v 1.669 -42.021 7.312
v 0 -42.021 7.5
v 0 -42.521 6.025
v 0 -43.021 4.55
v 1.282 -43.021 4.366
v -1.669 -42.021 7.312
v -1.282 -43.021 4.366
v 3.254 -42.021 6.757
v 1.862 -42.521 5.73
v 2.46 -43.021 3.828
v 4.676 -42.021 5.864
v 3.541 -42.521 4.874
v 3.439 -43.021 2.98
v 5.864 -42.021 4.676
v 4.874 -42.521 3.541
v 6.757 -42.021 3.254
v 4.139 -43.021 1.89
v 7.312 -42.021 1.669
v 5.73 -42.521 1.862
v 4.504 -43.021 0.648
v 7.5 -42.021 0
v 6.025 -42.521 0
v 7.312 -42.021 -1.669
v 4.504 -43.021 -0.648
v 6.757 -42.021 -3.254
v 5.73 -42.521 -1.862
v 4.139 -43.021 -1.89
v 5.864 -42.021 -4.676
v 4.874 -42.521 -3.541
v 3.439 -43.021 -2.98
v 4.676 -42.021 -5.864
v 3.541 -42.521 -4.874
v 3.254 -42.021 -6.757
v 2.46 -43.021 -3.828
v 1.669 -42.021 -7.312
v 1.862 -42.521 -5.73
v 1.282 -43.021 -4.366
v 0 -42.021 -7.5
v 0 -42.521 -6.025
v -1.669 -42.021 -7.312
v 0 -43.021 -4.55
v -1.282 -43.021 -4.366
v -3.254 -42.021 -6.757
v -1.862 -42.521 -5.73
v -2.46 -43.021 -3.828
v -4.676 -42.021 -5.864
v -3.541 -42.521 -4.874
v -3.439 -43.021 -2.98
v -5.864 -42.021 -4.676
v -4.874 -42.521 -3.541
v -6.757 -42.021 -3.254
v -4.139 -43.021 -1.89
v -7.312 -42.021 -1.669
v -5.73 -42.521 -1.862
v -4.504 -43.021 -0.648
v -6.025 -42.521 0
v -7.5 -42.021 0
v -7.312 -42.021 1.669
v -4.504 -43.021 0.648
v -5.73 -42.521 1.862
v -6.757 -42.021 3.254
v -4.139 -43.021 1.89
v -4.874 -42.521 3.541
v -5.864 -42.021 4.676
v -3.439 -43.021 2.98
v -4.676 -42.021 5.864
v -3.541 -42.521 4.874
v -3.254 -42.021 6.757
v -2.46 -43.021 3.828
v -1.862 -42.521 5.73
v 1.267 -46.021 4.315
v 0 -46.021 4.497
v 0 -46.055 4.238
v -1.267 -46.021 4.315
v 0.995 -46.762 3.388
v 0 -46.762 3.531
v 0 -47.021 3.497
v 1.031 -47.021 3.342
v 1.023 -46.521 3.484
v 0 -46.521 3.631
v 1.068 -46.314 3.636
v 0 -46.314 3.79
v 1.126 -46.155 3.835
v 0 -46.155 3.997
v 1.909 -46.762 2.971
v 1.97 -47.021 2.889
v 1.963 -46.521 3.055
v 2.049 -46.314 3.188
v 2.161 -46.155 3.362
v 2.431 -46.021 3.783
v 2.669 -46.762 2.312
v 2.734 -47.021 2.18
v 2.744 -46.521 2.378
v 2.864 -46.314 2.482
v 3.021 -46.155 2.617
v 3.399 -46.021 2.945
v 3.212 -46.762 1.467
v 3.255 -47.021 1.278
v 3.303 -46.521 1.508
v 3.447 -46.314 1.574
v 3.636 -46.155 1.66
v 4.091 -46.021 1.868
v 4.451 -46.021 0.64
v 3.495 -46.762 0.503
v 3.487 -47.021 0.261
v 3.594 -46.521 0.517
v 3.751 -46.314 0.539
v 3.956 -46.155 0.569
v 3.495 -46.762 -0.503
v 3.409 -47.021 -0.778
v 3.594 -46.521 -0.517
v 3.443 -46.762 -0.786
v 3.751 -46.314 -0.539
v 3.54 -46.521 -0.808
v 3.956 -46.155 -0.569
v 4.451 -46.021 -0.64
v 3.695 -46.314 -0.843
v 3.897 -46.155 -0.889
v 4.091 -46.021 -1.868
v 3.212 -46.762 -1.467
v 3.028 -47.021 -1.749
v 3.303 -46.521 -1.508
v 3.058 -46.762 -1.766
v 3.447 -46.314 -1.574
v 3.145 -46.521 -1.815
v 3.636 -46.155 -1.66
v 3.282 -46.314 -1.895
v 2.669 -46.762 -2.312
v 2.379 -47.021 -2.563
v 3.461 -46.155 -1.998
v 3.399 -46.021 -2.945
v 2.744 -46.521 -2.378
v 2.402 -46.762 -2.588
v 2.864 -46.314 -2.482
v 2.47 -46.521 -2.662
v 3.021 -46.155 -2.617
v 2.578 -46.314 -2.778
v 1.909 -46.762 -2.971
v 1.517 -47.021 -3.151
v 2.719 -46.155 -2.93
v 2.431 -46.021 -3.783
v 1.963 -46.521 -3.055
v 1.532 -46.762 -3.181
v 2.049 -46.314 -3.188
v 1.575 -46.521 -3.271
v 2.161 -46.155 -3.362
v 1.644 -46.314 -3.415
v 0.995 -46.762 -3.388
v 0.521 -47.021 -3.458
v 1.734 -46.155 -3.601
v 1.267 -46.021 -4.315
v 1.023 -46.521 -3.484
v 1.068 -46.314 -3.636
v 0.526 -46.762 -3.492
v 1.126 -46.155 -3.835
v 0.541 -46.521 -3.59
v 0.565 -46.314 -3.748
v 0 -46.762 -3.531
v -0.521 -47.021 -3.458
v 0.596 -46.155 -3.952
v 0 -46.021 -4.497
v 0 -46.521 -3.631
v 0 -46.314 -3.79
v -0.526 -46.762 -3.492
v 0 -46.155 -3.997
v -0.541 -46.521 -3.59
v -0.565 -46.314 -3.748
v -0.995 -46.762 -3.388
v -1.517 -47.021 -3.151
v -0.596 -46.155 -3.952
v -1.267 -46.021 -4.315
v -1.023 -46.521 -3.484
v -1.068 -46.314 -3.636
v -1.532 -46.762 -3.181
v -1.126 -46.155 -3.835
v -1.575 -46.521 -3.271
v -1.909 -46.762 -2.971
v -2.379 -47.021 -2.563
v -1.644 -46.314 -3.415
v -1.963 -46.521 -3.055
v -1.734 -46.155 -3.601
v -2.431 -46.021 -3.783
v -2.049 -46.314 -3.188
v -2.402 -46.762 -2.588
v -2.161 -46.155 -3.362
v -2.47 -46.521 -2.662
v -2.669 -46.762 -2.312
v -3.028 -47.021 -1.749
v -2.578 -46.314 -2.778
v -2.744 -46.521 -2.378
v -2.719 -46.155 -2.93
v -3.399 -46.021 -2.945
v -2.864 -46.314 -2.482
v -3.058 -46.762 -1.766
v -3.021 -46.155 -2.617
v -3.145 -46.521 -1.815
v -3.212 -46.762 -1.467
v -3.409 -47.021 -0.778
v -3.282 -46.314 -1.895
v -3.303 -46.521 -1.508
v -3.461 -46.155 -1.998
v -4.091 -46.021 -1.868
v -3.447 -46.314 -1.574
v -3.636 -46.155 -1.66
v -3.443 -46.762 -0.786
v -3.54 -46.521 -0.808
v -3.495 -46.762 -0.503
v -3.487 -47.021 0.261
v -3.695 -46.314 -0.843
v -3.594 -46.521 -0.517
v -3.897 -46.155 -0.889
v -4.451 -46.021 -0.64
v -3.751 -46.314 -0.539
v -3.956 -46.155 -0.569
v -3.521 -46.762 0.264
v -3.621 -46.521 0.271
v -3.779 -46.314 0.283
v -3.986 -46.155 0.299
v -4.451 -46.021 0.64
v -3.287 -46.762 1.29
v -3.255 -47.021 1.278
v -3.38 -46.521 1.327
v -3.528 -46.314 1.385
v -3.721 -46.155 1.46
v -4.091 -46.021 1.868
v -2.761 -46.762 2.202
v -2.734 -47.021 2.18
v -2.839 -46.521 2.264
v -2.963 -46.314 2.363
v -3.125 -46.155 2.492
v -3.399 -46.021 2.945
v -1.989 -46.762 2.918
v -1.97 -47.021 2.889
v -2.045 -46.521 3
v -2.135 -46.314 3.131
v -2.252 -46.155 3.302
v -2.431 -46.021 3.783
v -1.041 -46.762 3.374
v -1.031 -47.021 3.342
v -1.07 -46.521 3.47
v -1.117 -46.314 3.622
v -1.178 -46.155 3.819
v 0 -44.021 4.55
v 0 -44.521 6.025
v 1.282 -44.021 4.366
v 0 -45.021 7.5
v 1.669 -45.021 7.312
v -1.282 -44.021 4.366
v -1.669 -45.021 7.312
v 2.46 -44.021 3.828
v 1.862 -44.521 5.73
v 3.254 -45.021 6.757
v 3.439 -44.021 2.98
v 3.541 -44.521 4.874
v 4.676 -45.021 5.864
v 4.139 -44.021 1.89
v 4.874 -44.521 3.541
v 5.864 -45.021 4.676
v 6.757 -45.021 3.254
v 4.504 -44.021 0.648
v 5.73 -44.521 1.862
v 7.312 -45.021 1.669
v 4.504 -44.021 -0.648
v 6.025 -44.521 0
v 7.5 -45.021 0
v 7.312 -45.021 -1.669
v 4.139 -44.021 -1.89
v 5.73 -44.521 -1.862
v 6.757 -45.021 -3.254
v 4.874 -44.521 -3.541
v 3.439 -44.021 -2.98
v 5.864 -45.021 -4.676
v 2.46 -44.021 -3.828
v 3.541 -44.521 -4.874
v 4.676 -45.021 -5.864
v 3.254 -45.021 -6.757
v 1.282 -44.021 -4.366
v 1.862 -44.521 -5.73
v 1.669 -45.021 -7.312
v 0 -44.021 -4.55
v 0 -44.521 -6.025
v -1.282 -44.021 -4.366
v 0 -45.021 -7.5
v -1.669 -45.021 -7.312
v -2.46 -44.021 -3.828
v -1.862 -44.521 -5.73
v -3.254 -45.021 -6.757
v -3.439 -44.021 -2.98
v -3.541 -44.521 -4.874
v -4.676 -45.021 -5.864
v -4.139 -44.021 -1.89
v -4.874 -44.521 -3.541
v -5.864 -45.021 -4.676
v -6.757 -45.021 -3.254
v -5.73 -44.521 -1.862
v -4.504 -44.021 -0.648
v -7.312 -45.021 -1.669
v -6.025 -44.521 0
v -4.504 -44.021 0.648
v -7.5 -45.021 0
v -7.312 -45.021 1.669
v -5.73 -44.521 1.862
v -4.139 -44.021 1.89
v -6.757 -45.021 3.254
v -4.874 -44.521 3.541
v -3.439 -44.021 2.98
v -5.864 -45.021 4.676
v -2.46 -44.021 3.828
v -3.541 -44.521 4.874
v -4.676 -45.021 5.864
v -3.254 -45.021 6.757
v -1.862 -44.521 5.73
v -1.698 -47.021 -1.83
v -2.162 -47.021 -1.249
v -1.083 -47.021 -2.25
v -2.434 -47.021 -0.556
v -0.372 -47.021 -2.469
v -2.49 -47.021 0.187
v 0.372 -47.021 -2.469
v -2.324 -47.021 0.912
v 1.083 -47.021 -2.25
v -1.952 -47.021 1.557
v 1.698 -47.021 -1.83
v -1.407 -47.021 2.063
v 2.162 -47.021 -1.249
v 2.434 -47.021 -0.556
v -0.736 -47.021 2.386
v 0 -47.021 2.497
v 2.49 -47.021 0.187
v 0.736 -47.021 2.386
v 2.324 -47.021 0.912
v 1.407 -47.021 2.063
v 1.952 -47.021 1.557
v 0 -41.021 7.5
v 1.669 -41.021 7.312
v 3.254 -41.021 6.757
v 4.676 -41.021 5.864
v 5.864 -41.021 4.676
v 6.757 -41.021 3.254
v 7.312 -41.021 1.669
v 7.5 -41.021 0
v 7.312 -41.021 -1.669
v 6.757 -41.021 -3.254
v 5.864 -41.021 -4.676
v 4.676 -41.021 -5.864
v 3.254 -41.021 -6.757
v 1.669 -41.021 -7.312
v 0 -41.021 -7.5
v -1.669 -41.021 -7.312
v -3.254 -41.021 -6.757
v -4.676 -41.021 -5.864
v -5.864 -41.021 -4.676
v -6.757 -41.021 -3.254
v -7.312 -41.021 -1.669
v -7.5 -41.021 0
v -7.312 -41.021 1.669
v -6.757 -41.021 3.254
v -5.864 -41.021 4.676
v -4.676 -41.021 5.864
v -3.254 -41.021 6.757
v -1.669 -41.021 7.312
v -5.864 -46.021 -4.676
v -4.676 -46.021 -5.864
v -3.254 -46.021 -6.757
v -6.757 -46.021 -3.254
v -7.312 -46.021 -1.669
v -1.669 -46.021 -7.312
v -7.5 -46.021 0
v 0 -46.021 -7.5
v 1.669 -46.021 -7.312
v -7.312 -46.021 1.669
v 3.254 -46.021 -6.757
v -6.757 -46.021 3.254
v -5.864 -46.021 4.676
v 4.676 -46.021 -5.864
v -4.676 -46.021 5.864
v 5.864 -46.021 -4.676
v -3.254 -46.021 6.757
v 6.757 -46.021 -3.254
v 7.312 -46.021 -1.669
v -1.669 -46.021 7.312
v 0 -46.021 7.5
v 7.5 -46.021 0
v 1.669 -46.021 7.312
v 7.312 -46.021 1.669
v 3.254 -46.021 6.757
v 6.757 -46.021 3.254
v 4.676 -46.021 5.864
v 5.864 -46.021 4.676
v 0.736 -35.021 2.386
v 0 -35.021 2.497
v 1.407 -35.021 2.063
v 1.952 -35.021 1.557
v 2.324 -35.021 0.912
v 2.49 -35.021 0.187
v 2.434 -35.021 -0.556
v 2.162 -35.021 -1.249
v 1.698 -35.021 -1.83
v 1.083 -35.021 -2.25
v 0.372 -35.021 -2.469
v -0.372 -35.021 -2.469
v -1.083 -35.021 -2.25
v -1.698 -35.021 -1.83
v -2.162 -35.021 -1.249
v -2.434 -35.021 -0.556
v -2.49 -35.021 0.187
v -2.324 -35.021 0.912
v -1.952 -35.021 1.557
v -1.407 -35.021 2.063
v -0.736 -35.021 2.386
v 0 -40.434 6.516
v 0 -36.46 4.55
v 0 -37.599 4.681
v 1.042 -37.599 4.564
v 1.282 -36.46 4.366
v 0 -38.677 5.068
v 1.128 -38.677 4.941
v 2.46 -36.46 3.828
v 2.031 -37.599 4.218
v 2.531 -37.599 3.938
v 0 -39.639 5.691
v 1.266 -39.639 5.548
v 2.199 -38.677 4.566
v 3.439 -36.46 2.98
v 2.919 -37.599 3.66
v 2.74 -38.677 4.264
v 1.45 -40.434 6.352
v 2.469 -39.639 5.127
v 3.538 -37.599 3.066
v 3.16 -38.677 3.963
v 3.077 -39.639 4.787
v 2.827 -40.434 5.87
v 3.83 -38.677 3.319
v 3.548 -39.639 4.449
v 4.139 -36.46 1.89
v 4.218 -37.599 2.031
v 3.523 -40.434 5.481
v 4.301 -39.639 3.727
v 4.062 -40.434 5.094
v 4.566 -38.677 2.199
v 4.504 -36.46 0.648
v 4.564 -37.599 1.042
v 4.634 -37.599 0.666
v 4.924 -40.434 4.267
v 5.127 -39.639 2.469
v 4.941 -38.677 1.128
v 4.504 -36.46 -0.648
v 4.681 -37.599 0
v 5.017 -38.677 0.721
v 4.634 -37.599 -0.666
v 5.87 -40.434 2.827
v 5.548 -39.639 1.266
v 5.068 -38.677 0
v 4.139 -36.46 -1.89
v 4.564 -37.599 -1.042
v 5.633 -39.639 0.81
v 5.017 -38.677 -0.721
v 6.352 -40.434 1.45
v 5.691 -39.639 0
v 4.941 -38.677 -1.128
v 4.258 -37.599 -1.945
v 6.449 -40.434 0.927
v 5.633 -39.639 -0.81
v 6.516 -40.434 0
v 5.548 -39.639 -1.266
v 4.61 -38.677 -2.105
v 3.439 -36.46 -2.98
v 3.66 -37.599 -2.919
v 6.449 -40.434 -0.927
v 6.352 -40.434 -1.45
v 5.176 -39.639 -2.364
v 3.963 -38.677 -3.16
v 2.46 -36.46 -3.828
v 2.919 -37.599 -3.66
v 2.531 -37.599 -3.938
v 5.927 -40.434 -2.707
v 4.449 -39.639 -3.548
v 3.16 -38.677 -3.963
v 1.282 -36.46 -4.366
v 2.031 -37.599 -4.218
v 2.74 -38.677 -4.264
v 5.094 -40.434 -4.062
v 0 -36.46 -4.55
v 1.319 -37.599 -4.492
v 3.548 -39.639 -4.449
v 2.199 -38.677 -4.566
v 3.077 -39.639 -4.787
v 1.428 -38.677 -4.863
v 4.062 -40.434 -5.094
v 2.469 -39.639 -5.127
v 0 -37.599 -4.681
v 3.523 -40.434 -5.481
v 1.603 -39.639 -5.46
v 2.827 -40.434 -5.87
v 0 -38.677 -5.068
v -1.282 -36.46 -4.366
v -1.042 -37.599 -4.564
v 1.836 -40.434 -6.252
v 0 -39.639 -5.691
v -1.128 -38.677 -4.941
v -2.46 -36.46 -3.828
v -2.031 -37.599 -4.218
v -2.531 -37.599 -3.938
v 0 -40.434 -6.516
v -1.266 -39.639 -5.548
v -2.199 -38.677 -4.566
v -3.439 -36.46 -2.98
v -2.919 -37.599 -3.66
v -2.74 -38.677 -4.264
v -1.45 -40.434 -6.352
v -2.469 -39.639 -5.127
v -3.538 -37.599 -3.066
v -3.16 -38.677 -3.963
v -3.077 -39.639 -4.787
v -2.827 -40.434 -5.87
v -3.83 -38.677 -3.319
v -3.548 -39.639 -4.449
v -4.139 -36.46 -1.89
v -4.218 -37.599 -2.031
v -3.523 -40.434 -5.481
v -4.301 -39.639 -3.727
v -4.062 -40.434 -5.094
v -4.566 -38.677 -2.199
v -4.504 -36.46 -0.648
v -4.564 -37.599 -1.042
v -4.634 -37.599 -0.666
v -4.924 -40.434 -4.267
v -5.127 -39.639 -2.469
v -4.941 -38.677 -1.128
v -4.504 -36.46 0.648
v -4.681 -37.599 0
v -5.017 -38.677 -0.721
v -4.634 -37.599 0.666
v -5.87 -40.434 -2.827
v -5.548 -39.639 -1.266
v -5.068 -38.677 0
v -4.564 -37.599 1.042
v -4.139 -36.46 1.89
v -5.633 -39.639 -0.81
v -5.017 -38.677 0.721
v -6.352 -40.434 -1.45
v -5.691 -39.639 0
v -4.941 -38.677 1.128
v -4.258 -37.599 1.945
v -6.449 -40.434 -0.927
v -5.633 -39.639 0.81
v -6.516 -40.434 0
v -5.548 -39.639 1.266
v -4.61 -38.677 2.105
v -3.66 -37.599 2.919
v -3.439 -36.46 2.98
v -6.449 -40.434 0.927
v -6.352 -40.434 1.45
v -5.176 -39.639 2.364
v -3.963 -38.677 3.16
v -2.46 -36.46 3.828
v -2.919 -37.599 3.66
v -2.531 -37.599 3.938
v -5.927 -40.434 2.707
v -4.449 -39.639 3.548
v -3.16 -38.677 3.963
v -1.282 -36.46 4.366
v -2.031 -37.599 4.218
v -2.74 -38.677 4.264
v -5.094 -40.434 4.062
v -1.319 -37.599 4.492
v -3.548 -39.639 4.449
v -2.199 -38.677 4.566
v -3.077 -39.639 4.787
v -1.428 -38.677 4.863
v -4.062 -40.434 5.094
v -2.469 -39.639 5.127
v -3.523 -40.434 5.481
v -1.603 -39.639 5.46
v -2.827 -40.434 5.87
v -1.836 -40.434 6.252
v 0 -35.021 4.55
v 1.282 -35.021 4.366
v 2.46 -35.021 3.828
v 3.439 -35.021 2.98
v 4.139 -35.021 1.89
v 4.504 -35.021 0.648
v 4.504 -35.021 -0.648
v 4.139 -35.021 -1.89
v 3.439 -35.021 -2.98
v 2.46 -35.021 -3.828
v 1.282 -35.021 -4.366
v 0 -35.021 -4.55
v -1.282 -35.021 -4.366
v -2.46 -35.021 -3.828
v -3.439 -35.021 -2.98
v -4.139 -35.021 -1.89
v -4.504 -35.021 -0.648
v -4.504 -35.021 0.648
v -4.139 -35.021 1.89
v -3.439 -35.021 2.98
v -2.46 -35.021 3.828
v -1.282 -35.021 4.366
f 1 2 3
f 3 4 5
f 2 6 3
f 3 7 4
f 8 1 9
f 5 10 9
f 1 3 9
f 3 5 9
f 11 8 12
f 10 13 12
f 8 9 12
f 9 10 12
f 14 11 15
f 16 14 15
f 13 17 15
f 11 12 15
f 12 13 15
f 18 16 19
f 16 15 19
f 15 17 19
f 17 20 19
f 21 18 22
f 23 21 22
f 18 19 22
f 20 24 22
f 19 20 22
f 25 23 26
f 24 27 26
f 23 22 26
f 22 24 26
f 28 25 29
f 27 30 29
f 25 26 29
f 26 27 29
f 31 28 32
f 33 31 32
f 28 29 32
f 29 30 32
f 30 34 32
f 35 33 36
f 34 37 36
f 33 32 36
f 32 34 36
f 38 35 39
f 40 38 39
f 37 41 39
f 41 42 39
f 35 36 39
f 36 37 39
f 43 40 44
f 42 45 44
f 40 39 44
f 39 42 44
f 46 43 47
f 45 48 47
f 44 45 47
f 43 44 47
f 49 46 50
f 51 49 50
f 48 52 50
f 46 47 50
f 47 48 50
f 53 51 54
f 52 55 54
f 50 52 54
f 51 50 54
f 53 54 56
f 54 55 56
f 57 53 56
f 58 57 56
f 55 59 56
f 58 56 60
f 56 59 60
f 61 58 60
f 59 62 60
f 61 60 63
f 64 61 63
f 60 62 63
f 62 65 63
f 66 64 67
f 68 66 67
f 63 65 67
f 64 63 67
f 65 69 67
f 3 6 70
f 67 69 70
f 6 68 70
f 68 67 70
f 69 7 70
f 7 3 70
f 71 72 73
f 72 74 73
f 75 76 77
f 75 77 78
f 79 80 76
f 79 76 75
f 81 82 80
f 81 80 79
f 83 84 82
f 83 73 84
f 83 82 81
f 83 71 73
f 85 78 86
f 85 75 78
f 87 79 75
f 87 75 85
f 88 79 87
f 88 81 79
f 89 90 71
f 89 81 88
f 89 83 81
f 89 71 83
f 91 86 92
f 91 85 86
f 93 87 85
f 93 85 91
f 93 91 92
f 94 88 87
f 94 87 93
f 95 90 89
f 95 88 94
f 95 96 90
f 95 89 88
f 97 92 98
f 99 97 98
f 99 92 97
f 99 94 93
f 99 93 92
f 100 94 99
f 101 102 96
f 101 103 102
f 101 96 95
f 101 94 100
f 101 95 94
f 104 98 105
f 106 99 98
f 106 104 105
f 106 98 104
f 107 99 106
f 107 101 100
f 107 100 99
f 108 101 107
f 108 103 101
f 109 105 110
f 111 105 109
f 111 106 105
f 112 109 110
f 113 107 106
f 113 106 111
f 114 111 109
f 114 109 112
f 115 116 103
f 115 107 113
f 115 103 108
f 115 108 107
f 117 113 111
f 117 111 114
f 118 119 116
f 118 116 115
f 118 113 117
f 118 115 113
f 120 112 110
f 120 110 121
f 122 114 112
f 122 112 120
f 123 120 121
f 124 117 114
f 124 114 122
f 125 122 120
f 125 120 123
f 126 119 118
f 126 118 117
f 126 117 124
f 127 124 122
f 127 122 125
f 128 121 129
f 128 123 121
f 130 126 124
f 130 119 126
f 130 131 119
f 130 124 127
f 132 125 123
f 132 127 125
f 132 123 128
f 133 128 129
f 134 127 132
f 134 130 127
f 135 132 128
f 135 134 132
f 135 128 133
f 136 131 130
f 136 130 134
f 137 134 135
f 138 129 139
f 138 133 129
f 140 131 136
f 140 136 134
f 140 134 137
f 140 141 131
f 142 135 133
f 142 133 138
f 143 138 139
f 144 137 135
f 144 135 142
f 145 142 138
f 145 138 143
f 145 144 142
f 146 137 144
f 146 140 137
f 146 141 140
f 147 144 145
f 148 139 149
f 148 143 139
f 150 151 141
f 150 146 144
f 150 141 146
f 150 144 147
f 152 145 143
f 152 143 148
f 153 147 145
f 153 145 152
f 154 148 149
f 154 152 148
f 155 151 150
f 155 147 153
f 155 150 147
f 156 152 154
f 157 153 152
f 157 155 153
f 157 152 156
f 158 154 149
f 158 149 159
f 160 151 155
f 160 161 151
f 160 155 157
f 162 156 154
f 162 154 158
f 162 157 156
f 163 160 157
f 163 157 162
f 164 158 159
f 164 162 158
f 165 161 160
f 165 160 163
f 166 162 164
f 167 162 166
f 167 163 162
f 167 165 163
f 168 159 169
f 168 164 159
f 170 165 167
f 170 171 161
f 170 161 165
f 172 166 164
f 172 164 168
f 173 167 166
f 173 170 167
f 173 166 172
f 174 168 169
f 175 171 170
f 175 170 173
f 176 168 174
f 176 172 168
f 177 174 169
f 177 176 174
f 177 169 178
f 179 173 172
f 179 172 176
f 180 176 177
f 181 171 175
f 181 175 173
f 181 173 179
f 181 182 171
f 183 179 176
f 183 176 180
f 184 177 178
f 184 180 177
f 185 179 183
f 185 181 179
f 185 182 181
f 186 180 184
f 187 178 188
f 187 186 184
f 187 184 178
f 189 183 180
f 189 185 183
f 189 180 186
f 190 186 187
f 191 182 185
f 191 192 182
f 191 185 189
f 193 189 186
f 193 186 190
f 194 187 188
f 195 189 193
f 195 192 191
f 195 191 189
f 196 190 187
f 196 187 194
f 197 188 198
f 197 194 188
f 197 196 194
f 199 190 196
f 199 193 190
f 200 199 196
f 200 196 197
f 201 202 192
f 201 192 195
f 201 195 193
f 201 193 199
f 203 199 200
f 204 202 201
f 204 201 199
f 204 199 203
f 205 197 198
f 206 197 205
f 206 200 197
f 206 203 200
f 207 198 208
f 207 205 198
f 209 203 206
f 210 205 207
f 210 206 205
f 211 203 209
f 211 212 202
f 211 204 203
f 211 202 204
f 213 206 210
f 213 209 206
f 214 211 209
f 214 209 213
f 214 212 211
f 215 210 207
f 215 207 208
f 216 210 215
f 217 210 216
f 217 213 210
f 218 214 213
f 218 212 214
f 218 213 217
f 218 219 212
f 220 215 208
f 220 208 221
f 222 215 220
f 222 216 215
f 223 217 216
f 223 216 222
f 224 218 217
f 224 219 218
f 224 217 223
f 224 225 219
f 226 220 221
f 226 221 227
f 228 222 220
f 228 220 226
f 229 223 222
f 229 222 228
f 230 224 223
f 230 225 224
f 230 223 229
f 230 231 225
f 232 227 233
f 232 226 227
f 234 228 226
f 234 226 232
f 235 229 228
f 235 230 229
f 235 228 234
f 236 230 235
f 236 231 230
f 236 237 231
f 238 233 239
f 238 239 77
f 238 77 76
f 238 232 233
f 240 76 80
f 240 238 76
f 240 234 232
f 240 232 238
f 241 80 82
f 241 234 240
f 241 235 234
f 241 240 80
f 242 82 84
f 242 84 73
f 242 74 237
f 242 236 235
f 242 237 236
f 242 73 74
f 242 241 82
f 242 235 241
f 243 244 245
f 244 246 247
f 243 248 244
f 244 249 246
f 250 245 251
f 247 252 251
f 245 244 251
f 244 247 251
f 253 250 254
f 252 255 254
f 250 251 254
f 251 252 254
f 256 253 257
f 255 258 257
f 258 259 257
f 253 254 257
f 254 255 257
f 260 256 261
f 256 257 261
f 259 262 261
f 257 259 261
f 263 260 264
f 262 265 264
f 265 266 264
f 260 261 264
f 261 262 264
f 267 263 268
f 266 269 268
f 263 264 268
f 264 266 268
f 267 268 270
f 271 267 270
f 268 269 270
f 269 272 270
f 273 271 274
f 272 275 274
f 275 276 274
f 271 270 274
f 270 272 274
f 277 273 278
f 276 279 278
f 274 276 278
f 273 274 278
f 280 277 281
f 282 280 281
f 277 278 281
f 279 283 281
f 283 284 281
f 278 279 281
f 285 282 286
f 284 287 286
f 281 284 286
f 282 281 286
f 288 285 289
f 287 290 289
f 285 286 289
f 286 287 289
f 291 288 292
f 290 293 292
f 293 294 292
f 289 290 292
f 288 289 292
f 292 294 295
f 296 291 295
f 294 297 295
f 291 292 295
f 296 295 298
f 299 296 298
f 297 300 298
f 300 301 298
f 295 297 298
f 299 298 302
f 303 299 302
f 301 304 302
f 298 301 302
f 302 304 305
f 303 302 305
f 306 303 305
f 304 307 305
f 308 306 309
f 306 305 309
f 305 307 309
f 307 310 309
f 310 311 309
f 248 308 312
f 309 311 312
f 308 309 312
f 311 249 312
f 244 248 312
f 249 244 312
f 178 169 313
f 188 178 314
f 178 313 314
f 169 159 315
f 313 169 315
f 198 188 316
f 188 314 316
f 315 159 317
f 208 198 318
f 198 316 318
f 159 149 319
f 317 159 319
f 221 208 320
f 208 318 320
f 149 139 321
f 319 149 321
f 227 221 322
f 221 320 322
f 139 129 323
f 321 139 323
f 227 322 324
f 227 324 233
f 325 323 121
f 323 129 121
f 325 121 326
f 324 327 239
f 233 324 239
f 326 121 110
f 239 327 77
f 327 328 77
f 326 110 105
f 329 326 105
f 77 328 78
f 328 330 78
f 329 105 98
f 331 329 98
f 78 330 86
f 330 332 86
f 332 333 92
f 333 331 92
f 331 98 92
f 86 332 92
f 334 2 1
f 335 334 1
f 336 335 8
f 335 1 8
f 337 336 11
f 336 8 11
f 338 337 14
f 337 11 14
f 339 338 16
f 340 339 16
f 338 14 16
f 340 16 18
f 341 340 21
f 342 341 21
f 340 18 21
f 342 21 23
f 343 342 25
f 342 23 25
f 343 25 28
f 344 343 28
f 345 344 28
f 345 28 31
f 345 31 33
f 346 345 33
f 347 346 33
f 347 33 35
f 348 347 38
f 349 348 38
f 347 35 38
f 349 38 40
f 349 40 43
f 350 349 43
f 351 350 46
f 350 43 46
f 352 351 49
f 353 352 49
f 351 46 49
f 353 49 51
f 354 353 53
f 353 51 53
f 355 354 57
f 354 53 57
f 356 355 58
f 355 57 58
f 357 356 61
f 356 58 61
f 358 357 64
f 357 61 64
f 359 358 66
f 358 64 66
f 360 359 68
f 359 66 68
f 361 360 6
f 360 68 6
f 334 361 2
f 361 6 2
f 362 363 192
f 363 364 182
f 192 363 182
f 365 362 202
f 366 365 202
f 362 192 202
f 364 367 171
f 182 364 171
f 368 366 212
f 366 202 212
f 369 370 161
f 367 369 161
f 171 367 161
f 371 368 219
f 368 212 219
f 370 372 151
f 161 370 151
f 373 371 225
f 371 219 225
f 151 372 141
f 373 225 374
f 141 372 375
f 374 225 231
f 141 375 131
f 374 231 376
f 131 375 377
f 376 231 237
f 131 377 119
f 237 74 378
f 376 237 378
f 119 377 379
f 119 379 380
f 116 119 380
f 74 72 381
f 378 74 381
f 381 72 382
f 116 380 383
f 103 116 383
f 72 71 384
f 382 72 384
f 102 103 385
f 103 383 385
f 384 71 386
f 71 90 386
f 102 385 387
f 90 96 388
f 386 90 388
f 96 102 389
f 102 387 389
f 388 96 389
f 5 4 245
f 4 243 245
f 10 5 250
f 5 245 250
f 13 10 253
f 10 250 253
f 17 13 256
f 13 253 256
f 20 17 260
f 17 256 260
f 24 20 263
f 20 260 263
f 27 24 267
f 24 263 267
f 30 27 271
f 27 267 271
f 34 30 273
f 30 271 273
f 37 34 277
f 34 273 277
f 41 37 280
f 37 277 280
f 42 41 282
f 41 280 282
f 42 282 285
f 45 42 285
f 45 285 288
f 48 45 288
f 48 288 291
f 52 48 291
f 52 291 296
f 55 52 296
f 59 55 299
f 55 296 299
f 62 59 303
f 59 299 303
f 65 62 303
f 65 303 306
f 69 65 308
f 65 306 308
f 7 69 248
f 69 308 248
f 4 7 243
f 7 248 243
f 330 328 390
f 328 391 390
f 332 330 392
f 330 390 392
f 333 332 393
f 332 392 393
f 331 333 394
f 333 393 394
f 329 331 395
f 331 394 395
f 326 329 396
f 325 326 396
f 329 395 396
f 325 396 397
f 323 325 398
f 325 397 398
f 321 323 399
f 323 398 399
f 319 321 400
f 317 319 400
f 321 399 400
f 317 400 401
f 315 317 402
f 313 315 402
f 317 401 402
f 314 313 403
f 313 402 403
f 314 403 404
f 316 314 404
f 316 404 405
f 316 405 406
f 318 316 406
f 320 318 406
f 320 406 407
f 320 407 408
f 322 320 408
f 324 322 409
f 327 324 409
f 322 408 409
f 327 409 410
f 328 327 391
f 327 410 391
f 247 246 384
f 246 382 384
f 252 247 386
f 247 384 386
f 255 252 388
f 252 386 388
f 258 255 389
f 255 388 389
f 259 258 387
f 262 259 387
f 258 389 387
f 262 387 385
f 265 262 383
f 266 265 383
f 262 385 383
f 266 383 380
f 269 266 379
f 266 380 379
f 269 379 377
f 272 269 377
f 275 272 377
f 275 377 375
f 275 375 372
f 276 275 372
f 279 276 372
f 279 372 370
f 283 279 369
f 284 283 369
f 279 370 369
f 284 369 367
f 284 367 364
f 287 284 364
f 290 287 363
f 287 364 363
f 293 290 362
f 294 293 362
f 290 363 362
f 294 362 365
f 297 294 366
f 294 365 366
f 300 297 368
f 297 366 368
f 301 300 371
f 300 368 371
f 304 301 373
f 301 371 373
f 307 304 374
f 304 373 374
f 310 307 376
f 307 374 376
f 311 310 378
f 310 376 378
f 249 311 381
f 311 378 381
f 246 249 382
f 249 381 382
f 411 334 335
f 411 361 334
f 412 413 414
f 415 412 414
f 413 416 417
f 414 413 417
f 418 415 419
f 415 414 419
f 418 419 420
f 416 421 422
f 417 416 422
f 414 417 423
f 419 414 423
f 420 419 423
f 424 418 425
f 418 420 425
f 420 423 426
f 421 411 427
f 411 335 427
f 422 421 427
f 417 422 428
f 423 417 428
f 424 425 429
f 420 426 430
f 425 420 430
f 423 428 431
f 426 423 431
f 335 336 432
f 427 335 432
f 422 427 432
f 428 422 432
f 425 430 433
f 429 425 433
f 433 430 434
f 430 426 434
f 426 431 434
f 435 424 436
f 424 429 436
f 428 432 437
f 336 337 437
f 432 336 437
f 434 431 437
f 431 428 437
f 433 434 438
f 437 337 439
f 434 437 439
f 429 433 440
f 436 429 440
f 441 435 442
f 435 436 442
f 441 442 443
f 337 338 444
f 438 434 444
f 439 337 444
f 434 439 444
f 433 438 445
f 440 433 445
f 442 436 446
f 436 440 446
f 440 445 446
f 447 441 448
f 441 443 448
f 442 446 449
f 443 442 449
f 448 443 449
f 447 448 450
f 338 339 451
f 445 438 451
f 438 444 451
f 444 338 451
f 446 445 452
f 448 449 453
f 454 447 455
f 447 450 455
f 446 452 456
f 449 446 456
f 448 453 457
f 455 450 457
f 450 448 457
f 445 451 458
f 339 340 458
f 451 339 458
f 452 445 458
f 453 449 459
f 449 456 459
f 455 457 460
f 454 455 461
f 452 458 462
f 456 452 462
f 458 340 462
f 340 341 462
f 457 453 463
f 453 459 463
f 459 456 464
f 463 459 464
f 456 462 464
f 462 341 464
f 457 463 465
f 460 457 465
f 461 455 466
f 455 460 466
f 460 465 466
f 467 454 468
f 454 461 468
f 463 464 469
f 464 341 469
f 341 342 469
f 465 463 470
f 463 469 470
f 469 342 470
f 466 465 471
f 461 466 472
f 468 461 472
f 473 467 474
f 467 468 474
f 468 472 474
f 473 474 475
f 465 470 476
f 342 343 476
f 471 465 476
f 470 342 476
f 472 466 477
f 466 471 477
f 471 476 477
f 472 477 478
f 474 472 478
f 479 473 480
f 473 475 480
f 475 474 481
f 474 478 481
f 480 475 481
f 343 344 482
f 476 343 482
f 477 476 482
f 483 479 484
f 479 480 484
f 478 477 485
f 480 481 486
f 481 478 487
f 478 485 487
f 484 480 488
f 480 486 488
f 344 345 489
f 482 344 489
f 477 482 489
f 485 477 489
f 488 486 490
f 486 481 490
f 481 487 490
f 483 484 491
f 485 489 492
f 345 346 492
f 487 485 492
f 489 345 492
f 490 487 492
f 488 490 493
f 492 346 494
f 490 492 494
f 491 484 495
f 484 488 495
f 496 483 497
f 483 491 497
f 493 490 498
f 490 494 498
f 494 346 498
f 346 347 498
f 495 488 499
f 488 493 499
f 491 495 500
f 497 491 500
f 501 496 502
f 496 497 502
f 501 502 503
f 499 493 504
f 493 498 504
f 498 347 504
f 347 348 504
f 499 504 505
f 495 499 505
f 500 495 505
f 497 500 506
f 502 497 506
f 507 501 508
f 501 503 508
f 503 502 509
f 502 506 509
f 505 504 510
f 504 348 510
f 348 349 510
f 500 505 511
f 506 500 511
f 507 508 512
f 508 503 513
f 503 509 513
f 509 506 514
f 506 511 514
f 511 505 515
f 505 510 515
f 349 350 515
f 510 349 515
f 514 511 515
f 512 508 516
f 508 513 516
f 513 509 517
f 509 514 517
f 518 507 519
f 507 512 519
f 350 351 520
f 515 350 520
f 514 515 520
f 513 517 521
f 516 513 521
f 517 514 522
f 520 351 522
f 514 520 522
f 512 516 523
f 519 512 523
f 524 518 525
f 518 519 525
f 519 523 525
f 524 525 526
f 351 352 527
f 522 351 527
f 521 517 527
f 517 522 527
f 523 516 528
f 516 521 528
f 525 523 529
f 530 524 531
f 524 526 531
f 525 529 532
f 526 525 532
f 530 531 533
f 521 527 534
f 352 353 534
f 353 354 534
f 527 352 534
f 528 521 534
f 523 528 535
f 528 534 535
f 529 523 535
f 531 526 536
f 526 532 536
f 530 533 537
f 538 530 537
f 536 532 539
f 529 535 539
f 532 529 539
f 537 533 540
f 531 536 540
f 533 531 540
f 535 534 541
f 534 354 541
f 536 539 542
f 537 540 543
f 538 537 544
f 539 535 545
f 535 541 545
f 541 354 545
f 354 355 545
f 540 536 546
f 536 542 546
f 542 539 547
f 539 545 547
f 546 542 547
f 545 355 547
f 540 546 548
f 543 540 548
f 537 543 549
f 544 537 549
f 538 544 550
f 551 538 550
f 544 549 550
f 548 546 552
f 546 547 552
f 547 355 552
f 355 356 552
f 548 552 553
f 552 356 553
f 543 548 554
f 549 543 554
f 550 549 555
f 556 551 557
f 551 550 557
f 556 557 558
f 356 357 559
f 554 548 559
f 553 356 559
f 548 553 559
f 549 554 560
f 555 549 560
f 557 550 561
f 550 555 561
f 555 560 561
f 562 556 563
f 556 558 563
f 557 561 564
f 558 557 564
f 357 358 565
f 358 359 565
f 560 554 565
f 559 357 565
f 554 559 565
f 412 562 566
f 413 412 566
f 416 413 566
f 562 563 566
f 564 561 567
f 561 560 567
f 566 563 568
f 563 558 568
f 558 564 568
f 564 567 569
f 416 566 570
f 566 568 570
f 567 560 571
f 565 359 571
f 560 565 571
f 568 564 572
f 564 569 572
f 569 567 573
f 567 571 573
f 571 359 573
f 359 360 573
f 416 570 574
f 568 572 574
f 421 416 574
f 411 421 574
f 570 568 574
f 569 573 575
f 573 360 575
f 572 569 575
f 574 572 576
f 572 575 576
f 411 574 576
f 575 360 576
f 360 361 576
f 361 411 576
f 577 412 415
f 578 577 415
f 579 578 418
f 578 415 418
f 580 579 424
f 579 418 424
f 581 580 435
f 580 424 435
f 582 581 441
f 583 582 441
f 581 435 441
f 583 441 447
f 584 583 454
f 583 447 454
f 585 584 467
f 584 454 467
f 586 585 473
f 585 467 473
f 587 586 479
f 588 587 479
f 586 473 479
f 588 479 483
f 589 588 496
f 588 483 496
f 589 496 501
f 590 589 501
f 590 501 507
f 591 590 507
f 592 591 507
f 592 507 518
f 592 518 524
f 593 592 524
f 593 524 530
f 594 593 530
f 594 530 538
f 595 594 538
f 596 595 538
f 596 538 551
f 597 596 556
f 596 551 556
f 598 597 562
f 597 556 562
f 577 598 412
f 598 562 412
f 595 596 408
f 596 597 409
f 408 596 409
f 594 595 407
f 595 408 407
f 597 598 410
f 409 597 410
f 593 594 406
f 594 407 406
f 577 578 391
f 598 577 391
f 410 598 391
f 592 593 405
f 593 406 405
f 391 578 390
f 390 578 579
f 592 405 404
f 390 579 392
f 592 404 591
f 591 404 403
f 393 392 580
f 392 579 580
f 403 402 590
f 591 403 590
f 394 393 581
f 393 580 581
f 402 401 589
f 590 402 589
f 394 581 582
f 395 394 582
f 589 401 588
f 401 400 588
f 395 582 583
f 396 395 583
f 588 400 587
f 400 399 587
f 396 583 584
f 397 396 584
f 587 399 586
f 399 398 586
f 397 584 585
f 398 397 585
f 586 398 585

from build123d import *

# Parameters (mm, degrees)
F3_R = 0.99999


# Not quite as in the source:
# - a fillet or chamfer that OpenCascade refuses, or shapes differently, is made with other operations: its cross-section is extruded or revolved along the edge and cut away or added
# - a fillet or chamfer is up to 0.001 mm smaller than in the source, because OpenCascade refuses the exact size


with BuildPart() as f1:
    # F0 (on Right) → F1 (revolve)
    with BuildSketch(Plane.YZ):
        Polygon((-47.0208749175, 2.497), (-35.0208749175, 2.497), (-35.0208749175, 4.55), (-41.0208749175, 4.55), (-41.0208749175, 7.5), (-42.0208749175, 7.5), (-43.0208749175, 4.55), (-43.5208749175, 4.55), (-44.0208749175, 4.55), (-45.0208749175, 7.5), (-46.0208749175, 7.5), (-46.0208749175, 4.55), (-46.0208749175, 3.497), (-47.0208749175, 3.497), align=None)
    revolve(axis=Axis((0, -14.7727020085, 0), (0, 1, 0)))

    # F2: fillet of radius 5 on 1 edges, made by hand

    # F2_s1 → F2_t2 (revolve)
    with BuildSketch(Plane.YZ):
        with BuildLine():
            ThreePointArc((-36.460447306, 4.55), (-39.1761424288, 5.3517860941), (-41.0208749175, 7.5))
            Line((-41.0208749175, 7.5), (-41.1120834697, 7.459))
            ThreePointArc((-41.1120834697, 7.459), (-41.1208749175, 6.025), (-41.1208749175, 4.55))
            Line((-41.1208749175, 4.55), (-41.0208749175, 4.45))
            Line((-41.0208749175, 4.45), (-36.460447306, 4.45))
            Line((-36.460447306, 4.45), (-36.460447306, 4.55))
        make_face()
    revolve(axis=Axis((0, -41.0208749175, 0), (0, 1, 0)))

    # F3 (radius 1 in the source; OpenCascade refuses exactly that, so slightly less here)
    f3_edges = [f1.edges().sort_by_distance(p)[0] for p in [
        (0, -46.020875, -3.497),
    ]]
    fillet(f3_edges, radius=F3_R)


solid = f1.part
